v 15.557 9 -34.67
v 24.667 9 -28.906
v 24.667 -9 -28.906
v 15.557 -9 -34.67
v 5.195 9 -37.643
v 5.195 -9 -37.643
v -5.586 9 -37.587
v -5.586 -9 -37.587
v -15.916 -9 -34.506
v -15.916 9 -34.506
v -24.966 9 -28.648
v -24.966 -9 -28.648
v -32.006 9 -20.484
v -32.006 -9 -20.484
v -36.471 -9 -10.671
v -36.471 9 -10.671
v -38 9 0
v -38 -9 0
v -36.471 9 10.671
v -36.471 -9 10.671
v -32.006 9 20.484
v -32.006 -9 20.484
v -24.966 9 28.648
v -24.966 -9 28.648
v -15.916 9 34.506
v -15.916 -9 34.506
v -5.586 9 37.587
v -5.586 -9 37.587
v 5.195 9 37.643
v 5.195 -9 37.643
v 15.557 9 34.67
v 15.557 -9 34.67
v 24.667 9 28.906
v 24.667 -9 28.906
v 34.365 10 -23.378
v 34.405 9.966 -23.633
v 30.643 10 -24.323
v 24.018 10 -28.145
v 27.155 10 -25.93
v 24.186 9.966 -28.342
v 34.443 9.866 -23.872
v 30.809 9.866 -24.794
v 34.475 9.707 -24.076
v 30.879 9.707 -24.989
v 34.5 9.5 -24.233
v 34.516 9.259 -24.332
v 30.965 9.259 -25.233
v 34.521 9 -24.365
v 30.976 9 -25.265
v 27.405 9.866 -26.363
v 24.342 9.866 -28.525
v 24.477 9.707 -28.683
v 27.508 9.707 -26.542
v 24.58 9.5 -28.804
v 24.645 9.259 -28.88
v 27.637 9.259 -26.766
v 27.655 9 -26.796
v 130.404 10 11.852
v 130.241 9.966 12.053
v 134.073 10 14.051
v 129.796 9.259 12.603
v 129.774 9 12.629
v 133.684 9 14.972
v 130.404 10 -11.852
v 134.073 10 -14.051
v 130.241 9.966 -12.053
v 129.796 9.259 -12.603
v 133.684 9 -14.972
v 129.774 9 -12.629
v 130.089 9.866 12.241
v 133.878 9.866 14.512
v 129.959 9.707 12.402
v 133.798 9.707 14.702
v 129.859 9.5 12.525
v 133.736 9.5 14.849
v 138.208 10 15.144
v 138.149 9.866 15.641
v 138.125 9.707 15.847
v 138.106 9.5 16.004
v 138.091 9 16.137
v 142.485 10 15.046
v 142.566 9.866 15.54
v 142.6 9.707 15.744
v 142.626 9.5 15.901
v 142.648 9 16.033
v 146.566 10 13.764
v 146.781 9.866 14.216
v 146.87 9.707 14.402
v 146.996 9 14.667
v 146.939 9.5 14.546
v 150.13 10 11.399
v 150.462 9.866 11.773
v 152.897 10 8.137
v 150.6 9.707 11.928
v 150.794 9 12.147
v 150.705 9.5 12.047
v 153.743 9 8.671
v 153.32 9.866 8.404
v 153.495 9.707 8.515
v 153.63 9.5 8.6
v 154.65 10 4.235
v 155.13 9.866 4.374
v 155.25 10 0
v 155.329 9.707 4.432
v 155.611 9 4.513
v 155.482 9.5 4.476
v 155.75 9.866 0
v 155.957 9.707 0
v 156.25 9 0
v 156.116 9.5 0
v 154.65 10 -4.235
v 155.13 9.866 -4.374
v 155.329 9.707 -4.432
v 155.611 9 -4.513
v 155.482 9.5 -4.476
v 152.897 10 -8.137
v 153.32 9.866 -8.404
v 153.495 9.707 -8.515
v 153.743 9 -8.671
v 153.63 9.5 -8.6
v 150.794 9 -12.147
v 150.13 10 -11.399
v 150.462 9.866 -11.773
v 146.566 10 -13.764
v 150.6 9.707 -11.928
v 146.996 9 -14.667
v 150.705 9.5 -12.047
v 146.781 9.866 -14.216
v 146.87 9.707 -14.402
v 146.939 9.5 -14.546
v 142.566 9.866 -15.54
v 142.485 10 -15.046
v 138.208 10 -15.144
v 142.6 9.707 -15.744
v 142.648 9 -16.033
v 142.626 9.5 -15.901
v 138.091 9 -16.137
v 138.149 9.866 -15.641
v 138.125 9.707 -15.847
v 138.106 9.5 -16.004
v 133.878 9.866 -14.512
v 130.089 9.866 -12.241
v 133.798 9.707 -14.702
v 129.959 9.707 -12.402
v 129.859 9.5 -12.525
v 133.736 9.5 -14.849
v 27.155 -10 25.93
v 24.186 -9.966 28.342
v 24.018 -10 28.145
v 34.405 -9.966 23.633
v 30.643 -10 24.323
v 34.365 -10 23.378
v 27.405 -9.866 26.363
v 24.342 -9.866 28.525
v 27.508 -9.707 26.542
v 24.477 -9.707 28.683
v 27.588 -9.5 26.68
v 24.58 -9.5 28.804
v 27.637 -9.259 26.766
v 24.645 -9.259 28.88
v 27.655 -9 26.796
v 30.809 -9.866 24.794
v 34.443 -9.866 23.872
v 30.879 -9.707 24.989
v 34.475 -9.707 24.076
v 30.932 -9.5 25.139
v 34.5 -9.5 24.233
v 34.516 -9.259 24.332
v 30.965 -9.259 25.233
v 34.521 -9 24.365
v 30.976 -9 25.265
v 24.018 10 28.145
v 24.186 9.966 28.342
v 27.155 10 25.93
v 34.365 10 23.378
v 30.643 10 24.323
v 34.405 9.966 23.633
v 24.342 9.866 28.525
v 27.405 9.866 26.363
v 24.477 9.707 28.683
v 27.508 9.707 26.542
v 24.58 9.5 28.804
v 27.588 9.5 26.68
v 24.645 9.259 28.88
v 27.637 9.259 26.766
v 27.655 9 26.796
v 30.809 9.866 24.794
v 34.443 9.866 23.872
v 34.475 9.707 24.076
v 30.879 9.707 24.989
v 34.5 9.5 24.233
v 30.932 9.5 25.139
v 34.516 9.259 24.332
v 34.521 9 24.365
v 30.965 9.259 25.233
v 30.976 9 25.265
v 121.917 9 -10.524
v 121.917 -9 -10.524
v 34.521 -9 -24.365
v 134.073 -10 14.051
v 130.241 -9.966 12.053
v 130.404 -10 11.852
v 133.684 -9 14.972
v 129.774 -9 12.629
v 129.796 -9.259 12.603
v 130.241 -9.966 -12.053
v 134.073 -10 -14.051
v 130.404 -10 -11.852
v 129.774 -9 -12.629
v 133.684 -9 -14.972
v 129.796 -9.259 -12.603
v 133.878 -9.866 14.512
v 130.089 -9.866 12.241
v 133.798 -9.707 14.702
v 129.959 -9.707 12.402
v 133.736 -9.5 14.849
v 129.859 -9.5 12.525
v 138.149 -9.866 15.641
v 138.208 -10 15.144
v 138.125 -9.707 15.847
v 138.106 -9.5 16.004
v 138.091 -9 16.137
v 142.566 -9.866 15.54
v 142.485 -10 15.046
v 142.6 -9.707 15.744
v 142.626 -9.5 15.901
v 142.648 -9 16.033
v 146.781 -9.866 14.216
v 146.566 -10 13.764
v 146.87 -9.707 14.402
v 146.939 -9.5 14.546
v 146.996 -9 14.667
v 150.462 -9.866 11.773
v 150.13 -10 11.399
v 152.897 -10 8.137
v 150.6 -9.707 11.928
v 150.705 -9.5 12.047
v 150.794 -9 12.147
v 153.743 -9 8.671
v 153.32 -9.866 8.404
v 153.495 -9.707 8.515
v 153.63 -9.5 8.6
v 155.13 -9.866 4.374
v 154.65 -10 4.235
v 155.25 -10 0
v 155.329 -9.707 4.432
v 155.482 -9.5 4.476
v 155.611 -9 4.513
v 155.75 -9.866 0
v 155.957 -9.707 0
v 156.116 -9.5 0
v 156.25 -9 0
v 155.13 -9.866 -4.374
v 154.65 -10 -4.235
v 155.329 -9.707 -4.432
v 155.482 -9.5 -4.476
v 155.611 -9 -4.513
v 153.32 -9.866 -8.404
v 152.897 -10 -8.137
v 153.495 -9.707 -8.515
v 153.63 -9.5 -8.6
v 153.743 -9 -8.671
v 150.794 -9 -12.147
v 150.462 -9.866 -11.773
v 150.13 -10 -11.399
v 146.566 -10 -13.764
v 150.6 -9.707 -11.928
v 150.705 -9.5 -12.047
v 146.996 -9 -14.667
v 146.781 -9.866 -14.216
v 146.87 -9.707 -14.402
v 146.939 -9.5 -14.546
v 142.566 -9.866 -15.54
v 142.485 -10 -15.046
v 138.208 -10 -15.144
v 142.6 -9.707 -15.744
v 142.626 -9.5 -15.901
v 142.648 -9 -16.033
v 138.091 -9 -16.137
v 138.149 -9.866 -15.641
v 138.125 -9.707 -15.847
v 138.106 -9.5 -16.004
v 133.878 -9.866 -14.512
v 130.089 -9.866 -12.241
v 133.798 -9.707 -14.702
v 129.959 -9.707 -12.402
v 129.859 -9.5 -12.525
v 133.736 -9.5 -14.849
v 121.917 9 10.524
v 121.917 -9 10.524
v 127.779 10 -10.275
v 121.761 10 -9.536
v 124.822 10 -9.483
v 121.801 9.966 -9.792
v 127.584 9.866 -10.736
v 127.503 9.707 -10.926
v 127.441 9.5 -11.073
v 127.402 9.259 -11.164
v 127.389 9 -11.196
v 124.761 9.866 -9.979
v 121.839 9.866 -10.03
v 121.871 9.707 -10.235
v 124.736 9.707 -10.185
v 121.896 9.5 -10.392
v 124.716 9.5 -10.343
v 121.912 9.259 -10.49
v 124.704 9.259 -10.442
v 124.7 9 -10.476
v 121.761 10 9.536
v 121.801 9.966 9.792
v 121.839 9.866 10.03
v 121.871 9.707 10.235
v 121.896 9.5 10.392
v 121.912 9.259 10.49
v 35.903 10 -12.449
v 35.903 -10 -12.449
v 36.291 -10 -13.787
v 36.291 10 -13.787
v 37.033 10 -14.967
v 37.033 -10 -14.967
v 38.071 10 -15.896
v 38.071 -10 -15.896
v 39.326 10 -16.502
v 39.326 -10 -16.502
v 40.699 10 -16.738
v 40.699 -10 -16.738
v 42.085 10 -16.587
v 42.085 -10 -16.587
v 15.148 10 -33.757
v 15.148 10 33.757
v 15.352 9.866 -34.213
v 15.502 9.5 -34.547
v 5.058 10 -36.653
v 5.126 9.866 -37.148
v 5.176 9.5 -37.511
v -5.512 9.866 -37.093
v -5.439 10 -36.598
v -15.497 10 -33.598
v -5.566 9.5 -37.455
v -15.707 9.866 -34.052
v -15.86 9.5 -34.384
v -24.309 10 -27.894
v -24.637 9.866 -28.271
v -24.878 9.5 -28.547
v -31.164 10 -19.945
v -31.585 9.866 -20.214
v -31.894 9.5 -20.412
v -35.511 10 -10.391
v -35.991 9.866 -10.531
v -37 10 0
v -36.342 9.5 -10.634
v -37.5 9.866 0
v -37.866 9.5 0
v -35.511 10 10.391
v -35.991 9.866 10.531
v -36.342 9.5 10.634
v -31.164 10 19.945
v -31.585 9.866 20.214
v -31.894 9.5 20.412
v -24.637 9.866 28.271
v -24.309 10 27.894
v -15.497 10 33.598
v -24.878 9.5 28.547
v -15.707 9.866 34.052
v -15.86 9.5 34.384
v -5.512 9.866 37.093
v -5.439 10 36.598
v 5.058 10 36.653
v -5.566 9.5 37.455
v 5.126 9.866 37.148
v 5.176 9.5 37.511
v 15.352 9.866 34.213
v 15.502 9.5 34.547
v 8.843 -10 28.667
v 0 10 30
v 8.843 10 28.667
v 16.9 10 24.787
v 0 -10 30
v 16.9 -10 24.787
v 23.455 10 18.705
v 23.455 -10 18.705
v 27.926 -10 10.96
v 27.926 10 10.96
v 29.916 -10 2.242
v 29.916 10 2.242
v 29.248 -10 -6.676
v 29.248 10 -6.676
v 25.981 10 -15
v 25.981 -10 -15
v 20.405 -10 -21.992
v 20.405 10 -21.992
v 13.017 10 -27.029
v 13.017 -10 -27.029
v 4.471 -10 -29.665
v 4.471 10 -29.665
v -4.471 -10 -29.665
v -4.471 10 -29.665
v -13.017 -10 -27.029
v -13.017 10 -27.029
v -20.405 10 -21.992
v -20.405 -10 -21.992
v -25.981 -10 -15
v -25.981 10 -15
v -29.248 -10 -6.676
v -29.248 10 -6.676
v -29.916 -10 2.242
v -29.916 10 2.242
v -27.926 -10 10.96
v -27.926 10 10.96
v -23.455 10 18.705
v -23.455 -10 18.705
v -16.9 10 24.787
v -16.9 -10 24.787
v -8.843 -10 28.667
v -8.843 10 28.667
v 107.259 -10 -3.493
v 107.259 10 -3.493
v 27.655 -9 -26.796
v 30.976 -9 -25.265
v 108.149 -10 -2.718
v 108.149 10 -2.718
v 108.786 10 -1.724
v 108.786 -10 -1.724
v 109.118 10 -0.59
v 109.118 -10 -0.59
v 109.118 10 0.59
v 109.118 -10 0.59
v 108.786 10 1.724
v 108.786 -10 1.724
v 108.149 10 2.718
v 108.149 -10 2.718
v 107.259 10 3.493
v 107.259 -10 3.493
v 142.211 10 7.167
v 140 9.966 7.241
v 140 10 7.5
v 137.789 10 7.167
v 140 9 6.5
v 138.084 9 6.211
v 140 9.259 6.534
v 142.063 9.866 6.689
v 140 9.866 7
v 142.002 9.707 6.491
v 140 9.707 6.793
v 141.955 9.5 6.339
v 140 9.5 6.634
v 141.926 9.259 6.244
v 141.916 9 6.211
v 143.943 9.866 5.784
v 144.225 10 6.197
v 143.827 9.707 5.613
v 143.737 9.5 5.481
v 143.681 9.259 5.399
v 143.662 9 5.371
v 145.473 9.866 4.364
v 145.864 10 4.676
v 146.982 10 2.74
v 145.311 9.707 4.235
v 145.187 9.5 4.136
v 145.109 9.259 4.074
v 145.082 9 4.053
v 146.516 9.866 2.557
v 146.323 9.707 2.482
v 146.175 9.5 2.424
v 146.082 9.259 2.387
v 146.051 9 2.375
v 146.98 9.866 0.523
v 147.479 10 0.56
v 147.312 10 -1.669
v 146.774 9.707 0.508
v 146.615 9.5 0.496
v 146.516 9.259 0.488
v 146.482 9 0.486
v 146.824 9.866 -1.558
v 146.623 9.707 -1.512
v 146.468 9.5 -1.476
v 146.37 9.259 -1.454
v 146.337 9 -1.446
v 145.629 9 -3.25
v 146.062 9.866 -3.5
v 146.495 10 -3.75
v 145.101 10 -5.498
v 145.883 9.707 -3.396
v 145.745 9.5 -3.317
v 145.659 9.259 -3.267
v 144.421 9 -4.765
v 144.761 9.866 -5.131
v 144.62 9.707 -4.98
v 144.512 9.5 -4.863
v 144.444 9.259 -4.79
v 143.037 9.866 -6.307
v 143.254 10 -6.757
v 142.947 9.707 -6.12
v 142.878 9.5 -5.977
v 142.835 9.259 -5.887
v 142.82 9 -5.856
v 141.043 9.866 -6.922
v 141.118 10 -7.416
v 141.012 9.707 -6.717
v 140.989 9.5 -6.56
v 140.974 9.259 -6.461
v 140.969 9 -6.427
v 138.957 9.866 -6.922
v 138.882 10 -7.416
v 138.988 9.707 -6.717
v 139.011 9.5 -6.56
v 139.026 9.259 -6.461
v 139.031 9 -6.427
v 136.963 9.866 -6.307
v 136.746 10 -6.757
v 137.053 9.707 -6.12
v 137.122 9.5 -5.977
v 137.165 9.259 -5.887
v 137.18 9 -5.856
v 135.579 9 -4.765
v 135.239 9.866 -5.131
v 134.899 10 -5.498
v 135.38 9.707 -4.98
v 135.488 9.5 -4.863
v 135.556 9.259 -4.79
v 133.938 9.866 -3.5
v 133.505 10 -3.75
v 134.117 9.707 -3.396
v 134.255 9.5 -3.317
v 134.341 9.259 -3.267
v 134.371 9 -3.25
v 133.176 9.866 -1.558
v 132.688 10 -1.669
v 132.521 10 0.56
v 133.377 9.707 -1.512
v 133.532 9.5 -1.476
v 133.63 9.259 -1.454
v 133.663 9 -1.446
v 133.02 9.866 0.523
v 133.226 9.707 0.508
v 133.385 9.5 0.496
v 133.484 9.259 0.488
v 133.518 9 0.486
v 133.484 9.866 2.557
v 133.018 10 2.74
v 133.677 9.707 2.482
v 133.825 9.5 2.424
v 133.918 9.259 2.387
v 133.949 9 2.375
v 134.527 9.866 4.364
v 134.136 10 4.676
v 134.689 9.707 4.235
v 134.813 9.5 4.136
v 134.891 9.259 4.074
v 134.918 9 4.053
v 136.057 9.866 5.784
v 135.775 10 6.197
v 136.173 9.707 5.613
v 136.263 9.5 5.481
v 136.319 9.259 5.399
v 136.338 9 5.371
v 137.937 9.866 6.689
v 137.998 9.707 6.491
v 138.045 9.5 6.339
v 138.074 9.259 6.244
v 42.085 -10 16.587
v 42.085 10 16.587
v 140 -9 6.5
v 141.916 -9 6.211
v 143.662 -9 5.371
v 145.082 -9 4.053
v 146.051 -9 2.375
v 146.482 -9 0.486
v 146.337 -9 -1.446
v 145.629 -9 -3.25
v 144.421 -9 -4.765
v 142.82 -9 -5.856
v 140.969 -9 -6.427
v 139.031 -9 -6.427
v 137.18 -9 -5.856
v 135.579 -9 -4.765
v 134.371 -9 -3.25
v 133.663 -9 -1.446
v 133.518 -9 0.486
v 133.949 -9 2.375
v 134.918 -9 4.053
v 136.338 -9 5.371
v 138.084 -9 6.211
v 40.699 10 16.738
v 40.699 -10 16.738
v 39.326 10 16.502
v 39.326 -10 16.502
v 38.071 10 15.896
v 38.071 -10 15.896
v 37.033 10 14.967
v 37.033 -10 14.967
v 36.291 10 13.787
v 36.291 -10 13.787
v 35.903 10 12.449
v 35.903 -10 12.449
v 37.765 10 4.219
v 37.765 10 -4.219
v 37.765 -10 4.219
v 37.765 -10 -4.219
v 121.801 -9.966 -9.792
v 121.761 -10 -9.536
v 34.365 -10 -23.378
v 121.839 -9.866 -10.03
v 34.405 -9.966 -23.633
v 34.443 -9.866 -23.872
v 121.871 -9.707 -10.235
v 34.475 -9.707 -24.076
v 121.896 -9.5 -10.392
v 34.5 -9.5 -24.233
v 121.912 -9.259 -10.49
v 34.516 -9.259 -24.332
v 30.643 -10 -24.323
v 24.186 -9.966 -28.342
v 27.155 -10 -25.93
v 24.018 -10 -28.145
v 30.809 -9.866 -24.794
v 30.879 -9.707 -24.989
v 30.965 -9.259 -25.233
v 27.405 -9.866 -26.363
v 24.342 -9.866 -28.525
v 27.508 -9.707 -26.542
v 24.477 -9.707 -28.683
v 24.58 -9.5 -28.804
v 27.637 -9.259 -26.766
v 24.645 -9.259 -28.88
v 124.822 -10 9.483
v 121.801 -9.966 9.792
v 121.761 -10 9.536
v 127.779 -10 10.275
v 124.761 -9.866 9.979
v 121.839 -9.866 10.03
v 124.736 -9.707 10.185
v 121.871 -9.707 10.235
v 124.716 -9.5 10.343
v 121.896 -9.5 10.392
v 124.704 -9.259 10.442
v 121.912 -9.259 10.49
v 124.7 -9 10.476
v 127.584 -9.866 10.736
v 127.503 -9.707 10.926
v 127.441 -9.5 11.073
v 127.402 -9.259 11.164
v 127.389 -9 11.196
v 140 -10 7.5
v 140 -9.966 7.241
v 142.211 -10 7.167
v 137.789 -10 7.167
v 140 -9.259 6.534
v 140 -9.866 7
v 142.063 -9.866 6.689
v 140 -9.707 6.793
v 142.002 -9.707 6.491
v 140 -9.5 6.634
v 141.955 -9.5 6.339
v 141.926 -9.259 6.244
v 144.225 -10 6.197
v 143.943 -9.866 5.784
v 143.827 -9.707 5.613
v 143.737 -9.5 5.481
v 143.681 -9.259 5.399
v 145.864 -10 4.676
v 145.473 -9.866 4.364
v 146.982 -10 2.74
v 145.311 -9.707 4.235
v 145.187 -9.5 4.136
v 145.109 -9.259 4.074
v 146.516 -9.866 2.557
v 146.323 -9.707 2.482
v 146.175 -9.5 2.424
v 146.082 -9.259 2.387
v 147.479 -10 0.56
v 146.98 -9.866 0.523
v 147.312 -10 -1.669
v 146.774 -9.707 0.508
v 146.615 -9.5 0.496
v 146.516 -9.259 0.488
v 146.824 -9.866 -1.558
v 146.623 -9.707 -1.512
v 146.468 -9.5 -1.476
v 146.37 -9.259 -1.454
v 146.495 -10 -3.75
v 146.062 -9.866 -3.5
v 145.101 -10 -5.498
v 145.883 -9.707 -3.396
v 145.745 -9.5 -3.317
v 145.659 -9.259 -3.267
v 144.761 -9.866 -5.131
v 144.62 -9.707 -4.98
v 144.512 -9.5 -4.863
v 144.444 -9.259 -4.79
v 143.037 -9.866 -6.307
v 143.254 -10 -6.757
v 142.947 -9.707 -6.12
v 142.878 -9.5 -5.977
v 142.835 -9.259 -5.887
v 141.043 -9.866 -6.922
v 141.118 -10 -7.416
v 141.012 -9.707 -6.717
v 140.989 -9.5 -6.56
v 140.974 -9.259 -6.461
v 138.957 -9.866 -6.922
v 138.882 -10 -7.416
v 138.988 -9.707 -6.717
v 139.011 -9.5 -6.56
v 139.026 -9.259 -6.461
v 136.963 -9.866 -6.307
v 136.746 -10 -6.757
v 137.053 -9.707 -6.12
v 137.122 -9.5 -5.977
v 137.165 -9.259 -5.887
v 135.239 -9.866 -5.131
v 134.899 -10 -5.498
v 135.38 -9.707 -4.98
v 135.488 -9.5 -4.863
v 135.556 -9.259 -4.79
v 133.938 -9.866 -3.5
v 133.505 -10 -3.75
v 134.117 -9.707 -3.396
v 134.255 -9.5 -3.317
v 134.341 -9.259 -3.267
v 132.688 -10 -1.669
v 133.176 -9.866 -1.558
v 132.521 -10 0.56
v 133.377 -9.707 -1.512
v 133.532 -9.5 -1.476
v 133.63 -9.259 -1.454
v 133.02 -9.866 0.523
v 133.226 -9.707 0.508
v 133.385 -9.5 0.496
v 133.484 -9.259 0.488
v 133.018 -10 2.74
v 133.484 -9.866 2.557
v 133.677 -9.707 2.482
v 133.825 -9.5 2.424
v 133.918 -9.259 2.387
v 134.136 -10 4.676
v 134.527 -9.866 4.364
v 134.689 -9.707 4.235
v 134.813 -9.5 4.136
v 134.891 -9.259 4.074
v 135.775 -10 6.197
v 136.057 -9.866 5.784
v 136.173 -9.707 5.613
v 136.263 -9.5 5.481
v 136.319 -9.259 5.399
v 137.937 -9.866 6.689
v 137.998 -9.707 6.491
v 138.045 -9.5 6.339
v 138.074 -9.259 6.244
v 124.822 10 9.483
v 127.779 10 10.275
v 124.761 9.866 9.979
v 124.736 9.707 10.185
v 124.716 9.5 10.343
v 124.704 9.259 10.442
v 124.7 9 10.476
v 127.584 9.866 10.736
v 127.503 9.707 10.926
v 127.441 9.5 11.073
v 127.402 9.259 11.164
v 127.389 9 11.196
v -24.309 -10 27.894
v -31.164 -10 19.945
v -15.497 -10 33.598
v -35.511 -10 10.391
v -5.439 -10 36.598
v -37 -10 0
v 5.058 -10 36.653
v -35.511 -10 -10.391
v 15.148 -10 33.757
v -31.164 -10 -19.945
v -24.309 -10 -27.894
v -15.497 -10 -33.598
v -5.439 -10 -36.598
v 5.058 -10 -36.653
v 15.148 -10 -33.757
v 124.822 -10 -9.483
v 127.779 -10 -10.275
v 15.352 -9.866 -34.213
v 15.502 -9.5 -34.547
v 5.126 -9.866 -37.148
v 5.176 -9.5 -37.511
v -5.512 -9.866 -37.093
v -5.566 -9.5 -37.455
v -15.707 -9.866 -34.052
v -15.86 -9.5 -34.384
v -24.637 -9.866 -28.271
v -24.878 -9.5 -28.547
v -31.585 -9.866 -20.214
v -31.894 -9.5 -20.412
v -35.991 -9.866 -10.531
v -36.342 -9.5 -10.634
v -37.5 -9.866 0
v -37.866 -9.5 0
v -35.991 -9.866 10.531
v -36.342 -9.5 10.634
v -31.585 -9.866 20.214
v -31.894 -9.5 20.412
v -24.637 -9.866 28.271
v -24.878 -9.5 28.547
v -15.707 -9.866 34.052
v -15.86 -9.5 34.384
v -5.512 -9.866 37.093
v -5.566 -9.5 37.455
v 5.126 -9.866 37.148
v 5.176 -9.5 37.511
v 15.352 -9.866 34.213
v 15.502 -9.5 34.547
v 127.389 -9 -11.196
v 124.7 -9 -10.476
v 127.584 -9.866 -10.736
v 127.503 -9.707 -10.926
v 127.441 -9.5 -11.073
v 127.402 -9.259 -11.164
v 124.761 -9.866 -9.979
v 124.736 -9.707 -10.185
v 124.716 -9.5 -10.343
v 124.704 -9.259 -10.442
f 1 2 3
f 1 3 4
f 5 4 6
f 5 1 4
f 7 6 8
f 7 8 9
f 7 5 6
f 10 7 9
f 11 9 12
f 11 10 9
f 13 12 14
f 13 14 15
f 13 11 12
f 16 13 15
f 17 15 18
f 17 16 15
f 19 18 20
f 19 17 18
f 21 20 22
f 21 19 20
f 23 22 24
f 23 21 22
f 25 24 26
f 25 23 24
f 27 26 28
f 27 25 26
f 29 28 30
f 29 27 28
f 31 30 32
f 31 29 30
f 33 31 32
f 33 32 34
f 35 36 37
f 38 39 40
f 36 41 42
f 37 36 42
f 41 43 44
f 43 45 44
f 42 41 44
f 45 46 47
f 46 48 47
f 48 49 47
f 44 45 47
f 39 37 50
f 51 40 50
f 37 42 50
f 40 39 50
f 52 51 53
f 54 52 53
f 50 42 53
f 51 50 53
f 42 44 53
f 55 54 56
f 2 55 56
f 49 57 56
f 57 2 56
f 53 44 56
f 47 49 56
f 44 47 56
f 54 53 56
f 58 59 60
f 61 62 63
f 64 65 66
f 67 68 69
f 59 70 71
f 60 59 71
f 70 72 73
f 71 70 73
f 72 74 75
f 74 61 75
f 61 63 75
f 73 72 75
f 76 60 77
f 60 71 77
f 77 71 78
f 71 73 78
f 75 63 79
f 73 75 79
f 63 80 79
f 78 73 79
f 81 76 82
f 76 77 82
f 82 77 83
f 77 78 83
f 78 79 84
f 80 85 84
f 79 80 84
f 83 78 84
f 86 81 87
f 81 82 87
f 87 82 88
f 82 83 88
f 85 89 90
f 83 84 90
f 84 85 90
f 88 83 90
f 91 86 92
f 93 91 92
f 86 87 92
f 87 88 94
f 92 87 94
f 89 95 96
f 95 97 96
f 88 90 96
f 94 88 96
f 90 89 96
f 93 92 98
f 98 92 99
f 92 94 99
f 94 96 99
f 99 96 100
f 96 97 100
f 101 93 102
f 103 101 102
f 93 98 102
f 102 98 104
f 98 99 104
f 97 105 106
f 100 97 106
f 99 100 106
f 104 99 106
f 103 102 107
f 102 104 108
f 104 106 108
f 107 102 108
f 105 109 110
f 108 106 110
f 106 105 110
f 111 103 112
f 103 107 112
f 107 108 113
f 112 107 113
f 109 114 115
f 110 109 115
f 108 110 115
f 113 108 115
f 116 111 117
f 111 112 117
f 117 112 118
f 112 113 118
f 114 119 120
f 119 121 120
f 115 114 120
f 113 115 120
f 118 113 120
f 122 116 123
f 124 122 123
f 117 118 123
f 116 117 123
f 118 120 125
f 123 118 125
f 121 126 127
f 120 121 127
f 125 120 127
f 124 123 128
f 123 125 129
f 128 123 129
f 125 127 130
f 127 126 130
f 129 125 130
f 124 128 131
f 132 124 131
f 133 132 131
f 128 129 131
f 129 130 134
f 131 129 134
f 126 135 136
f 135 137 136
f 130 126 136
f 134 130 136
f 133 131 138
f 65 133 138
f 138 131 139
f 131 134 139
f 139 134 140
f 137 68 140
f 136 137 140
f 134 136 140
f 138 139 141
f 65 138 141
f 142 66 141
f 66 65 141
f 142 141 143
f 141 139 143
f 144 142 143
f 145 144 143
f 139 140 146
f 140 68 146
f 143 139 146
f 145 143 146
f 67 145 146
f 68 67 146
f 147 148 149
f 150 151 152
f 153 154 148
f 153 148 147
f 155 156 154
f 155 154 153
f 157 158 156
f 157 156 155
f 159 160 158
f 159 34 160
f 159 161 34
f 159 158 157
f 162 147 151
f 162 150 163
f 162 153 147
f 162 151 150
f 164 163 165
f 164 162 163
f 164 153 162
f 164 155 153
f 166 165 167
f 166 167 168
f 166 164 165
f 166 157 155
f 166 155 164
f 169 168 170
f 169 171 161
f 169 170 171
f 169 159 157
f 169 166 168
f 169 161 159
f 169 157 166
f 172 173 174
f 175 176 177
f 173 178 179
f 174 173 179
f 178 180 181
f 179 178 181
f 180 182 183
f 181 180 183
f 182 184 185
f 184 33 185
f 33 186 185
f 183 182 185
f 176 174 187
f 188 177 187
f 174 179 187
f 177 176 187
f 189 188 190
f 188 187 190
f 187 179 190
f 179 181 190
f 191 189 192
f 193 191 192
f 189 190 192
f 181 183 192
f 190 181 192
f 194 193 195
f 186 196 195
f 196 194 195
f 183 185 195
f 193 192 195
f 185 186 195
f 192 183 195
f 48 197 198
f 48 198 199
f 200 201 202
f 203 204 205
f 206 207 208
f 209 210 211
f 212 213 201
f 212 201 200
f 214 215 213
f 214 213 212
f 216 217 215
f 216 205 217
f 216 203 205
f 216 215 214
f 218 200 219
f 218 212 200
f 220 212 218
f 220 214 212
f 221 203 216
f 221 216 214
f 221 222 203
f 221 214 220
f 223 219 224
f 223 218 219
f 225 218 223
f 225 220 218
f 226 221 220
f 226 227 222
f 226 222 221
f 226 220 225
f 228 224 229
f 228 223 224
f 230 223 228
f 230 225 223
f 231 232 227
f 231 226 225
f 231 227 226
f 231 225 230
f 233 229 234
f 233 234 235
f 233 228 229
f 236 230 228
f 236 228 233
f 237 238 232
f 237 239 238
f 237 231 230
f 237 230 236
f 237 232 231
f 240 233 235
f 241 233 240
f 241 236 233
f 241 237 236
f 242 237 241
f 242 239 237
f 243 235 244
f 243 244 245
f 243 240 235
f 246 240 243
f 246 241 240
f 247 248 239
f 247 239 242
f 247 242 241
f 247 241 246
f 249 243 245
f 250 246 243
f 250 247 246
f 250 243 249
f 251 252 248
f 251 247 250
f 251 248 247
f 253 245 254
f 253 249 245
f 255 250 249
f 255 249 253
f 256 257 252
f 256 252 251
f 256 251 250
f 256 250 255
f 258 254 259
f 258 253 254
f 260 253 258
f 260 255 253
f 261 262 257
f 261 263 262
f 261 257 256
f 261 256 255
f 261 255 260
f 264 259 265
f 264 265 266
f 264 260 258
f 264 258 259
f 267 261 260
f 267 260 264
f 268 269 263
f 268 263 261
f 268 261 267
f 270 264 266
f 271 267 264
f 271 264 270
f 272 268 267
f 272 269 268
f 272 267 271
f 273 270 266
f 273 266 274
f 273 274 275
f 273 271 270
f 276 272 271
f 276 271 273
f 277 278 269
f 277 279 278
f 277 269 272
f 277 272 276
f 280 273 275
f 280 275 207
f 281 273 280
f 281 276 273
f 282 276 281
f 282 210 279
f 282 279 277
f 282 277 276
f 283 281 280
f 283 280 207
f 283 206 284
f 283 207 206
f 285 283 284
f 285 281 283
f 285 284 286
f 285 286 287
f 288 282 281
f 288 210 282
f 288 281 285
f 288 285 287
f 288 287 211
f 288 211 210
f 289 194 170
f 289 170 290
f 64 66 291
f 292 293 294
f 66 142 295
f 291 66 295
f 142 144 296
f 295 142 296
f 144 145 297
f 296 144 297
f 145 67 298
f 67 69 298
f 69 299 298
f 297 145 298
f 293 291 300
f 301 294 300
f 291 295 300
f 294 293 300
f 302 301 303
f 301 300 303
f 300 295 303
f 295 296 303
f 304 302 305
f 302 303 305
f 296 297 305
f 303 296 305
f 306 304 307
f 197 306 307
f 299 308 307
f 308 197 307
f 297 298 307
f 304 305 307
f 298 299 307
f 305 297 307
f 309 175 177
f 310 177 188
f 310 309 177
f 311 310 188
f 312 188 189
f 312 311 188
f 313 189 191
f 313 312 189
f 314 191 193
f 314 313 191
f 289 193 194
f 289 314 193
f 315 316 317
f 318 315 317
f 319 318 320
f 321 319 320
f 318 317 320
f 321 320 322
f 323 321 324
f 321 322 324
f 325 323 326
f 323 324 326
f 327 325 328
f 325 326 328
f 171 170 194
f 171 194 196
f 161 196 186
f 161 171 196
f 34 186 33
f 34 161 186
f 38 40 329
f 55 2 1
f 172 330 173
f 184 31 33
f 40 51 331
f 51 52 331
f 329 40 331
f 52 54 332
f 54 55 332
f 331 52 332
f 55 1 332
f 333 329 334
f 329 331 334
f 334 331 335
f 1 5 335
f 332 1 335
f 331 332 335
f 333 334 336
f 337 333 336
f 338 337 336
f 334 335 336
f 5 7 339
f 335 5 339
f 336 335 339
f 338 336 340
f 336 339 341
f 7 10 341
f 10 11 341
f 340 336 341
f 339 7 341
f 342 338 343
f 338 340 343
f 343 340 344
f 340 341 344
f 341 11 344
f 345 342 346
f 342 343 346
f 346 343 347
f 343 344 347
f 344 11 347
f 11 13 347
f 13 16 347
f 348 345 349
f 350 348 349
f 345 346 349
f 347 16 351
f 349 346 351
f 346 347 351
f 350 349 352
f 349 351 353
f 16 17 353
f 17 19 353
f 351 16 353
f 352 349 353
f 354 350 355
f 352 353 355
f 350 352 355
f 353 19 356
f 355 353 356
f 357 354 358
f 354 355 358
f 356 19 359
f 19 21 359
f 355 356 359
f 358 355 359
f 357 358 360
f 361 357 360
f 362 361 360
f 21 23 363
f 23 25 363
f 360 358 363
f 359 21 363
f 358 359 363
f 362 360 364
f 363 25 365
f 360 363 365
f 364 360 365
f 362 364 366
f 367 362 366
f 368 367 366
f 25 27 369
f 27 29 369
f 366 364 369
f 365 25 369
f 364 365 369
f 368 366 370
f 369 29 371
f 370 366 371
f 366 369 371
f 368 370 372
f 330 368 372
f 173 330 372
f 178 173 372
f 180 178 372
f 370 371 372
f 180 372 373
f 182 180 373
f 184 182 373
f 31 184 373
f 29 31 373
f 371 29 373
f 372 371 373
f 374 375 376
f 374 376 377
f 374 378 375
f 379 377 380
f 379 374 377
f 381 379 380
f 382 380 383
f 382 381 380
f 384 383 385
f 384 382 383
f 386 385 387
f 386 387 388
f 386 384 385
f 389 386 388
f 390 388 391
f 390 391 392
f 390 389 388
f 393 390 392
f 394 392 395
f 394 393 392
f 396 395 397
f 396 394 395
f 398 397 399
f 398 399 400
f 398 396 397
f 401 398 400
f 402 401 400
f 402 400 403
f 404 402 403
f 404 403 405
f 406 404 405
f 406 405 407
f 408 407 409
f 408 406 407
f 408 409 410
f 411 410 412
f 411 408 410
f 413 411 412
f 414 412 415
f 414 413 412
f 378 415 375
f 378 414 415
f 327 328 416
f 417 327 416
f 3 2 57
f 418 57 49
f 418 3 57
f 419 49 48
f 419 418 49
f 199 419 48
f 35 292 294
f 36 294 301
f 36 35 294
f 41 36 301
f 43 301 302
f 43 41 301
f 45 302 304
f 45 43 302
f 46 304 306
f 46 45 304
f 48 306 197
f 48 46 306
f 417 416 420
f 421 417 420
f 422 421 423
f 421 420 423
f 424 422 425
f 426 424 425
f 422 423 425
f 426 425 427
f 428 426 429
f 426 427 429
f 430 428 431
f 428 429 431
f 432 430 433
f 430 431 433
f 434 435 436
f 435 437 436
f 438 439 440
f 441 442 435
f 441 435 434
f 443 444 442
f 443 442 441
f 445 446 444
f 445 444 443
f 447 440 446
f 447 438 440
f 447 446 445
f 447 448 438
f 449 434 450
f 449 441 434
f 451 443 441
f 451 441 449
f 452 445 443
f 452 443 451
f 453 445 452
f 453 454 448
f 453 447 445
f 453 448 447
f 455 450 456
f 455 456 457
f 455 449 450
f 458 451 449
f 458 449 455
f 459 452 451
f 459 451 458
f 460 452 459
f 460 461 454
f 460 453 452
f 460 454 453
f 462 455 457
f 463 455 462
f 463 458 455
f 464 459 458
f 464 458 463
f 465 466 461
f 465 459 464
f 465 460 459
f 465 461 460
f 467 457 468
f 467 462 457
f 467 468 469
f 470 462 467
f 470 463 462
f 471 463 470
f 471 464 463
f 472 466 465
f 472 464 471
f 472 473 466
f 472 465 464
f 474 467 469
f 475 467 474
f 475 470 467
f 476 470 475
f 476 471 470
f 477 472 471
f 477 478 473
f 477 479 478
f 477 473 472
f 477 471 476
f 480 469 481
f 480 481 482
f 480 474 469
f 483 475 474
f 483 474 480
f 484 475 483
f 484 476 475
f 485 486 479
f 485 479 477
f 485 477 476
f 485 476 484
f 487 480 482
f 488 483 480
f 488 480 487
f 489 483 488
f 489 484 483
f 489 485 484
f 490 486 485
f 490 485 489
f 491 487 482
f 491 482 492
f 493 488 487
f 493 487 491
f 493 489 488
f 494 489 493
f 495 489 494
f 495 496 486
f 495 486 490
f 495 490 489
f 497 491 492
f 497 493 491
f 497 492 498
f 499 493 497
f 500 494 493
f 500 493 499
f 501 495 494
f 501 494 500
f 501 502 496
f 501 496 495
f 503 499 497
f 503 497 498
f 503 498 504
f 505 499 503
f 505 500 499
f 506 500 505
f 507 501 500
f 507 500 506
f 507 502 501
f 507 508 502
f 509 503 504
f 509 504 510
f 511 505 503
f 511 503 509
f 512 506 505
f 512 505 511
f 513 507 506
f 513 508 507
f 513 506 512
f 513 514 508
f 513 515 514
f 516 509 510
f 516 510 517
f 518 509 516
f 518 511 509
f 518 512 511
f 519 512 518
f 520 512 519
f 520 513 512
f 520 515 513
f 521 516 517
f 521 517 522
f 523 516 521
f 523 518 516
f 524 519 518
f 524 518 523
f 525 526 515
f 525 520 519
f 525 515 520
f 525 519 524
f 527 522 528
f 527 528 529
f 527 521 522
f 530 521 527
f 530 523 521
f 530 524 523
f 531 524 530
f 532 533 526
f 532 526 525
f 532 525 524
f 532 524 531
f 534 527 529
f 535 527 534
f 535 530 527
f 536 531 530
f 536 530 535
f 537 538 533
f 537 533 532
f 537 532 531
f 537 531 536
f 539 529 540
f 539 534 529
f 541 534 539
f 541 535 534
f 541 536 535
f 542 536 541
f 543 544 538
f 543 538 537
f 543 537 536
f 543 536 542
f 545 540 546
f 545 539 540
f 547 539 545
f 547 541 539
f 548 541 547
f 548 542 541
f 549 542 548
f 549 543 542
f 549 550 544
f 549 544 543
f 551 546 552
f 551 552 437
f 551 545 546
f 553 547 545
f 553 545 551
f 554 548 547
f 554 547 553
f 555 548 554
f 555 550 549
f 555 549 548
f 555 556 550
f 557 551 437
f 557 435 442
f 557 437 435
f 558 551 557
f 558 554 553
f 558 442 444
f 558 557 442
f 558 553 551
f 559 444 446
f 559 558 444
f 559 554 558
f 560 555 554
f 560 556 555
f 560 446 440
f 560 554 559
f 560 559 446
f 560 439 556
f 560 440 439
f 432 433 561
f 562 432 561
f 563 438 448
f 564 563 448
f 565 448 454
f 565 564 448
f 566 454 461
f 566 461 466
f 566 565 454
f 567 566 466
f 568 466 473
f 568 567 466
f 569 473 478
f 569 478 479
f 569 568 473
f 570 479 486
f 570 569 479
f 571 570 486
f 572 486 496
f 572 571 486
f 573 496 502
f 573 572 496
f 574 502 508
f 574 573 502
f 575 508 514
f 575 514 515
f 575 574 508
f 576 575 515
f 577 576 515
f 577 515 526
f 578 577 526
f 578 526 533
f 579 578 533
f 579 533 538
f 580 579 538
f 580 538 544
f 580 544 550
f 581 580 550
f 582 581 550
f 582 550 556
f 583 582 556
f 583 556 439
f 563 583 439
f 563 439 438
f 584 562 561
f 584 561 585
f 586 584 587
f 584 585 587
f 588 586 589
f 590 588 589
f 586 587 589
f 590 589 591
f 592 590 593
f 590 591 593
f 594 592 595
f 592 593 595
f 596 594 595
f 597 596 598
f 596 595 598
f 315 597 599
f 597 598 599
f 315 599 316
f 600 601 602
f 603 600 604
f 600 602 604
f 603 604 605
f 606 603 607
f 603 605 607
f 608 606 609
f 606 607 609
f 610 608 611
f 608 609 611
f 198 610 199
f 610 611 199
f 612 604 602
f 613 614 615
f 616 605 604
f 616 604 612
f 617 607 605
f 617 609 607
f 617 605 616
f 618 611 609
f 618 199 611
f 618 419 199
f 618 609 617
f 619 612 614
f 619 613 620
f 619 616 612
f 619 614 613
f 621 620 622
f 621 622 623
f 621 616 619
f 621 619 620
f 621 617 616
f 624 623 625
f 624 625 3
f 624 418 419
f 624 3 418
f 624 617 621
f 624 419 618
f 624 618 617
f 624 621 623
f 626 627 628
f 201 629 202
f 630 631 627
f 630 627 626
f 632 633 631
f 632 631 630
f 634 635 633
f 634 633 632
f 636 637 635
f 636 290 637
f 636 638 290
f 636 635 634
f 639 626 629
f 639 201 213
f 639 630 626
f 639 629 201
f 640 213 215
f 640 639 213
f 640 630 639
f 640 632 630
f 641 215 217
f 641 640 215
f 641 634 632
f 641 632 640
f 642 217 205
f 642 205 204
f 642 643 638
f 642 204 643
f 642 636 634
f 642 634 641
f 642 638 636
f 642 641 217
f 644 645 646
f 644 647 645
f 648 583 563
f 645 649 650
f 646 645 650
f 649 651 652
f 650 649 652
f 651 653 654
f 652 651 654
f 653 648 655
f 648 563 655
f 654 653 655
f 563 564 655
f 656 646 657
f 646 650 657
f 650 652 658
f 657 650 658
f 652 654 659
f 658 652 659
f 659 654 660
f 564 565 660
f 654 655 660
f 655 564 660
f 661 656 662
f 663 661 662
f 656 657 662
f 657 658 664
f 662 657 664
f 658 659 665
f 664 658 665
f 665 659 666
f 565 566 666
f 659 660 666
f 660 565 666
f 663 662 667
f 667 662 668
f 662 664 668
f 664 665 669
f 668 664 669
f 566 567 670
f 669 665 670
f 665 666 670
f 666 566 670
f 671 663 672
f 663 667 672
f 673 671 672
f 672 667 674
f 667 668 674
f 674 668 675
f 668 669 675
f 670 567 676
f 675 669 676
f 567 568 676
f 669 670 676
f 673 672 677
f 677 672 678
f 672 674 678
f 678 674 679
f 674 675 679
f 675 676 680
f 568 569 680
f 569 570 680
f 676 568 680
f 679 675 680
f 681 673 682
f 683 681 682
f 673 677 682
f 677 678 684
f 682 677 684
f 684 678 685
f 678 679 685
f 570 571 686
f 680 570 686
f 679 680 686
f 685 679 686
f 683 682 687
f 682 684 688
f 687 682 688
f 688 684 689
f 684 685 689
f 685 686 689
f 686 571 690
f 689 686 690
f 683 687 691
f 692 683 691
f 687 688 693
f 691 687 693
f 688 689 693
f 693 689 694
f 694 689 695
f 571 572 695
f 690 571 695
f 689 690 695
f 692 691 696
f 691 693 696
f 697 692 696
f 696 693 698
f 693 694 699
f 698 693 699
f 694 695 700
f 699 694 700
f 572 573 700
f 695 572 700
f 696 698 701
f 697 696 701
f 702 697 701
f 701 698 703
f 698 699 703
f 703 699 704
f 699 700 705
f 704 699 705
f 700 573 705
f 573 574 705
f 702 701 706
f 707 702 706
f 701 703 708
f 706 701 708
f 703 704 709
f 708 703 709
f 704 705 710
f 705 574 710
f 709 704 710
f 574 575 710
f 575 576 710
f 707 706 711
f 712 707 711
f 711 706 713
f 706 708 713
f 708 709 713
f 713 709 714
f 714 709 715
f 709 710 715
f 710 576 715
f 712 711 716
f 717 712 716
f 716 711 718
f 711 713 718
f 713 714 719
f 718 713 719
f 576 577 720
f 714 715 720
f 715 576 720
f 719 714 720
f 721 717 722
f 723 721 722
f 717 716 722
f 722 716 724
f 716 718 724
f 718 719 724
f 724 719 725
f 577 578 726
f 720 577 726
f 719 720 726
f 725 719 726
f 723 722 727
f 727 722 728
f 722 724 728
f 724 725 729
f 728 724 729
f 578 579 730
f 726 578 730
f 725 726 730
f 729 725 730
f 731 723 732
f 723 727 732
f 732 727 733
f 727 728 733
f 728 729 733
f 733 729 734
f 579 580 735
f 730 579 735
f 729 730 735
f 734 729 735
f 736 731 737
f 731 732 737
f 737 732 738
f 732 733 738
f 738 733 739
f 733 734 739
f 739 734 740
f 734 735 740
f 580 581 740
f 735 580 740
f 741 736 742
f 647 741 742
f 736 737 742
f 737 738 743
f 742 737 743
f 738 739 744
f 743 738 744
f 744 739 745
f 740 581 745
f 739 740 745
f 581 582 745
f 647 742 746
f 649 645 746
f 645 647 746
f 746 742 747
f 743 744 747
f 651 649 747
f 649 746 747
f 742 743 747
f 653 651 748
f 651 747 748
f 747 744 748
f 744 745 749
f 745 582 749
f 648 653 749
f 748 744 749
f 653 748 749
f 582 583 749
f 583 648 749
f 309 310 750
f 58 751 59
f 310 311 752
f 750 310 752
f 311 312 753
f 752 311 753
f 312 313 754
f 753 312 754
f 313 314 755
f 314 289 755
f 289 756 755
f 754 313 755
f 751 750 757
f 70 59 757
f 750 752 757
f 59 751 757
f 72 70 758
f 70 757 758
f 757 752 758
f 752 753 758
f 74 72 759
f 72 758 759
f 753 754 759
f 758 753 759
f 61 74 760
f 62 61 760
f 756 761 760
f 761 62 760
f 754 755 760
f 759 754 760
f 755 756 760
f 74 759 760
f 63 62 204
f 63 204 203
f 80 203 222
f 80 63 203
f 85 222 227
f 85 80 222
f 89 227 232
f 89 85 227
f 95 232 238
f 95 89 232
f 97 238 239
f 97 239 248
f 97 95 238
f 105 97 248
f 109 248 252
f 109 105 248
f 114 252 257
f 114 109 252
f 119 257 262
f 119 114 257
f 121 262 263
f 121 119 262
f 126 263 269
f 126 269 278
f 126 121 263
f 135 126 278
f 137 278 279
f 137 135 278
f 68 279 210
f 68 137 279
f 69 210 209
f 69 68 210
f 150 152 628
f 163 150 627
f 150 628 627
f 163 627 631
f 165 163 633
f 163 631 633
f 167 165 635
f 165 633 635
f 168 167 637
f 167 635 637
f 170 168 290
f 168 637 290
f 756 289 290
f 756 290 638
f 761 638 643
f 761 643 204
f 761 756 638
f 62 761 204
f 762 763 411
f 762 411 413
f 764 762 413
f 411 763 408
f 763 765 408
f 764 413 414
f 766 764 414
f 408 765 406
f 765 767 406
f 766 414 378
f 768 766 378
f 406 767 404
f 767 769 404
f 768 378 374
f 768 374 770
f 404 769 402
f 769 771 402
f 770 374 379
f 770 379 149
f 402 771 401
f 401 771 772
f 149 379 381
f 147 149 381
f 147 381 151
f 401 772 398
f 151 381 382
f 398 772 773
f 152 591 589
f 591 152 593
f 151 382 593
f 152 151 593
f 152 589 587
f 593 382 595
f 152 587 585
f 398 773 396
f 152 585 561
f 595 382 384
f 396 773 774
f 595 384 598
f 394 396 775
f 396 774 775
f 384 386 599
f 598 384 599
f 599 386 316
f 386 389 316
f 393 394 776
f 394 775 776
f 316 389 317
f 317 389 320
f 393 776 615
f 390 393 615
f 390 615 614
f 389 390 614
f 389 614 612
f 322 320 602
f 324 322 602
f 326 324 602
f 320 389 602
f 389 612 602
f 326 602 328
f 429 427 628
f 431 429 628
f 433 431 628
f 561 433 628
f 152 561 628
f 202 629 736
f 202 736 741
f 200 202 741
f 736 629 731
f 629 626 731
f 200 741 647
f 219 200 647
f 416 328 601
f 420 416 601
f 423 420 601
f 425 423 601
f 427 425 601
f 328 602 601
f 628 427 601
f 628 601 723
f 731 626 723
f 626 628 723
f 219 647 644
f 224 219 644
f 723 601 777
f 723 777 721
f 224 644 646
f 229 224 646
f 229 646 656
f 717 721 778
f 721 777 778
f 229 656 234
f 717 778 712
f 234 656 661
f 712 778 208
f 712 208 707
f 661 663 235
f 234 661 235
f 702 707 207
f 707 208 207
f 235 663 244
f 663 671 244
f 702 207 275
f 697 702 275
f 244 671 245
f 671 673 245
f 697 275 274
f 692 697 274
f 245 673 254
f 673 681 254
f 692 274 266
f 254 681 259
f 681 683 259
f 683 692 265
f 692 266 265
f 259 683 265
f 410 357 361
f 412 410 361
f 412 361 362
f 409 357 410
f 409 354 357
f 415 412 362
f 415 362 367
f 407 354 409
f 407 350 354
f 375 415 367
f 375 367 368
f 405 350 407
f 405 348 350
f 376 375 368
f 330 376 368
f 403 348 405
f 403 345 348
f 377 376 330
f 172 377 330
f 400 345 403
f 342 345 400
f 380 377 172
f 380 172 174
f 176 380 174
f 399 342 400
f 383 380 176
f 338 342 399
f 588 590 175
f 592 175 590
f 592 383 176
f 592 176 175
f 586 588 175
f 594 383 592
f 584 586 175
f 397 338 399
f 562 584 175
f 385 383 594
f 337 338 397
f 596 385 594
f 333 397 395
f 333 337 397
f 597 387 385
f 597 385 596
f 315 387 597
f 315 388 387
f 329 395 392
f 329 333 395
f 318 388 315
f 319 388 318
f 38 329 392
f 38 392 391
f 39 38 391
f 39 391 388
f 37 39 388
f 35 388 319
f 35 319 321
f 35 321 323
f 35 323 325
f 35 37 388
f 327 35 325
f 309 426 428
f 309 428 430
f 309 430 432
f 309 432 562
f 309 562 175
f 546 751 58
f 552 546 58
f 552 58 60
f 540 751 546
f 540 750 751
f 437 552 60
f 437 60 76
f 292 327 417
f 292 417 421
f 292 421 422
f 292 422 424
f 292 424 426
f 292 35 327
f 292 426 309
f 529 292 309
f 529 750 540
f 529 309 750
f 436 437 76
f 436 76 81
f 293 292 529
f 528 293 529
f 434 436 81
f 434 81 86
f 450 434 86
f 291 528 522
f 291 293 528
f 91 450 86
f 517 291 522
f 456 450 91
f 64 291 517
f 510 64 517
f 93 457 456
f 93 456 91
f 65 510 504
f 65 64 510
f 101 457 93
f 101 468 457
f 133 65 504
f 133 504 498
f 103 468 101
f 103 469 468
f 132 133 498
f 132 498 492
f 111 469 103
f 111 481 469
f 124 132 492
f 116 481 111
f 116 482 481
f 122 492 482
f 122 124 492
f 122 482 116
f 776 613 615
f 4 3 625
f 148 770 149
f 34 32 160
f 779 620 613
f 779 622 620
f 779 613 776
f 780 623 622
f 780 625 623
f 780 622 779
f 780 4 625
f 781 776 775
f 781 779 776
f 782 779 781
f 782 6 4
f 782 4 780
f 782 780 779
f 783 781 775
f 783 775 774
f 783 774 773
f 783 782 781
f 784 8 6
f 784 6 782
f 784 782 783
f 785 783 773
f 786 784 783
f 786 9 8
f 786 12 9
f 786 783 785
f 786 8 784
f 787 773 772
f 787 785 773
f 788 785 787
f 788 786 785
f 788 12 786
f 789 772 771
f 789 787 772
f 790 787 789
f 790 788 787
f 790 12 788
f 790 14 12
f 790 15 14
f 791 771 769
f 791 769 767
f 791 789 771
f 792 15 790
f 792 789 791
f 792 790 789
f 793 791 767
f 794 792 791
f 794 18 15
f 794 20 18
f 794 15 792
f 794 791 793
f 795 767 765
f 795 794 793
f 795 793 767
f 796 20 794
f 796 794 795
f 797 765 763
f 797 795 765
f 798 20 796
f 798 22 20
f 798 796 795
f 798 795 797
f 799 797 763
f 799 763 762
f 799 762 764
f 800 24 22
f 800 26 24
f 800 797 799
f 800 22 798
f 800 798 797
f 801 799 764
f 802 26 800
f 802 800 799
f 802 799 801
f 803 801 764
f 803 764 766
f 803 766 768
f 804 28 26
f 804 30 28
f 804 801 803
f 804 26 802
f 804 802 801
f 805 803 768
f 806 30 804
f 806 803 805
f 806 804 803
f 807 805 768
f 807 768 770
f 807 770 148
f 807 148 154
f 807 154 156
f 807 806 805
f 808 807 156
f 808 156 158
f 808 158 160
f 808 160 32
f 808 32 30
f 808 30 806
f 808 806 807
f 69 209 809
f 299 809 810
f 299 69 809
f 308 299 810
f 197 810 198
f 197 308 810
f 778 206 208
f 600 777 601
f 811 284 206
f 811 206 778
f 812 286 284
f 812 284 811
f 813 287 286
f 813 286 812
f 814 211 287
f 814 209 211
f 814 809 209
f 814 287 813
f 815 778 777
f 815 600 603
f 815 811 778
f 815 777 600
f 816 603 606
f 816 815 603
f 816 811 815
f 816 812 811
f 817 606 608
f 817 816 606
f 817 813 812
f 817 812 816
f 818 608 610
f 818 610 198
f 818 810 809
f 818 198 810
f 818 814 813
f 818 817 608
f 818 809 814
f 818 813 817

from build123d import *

# Parameters (mm, degrees)
SKETCH1_R           = 30
SKETCH1_R_2         = 6.5
BOSS_EXTRUDE1_DEPTH = 10
FILLET1_R           = 20
FILLET2_R           = 10
CUT_EXTRUDE1_DEPTH  = 163.043396965
FILLET3_R           = 1


with BuildPart() as part:
    # Sketch1 → Boss-Extrude1 (new, symmetric)
    with BuildSketch(Plane(origin=(0, 0, 0), x_dir=(1, 0, 0), z_dir=(0, 1, 0))):
        with BuildLine():
            Line((28.309347234, -25.349178669), (126.979372859, -9.722436364))
            ThreePointArc((126.979372859, -9.722436364), (156.25, 0), (126.979372859, 9.722436364))
            Line((126.979372859, 9.722436364), (28.309347234, 25.349178669))
            ThreePointArc((28.309347234, 25.349178669), (-38, 0), (28.309347234, -25.349178669))
        make_face()
        with Locations(Location((0, 0, 0), (0, 0, 270))):
            Circle(SKETCH1_R, mode=Mode.SUBTRACT)
        with Locations(Location((140, 0, 0), (0, 0, 270))):
            Circle(SKETCH1_R_2, mode=Mode.SUBTRACT)
    extrude(amount=BOSS_EXTRUDE1_DEPTH, both=True)

    # Fillet1
    fillet1_edges = [part.edges().sort_by_distance(p)[0] for p in [
        (28.309347234, 0, -25.349178669),
        (28.309347234, 0, 25.349178669),
    ]]
    fillet(fillet1_edges, radius=FILLET1_R)

    # Fillet2
    fillet2_edges = [part.edges().sort_by_distance(p)[0] for p in [
        (126.979372859, 0, -9.722436364),
        (126.979372859, 0, 9.722436364),
    ]]
    fillet(fillet2_edges, radius=FILLET2_R)

    # Sketch2 → Cut-Extrude1 (cut, through all)
    with BuildSketch(Plane.XZ.offset(10)):
        with BuildLine():
            Line((42.084593021, -16.586528838), (107.258618966, -3.493133042))
            ThreePointArc((107.258618966, -3.493133042), (109.159728126, 0), (107.258618966, 3.493133042))
            Line((107.258618966, 3.493133042), (42.084593021, 16.586528838))
            ThreePointArc((42.084593021, 16.586528838), (38.071391156, 15.895857226), (35.902950989, 12.449020454))
            ThreePointArc((35.902950989, 12.449020454), (38, 0), (35.902950989, -12.449020454))
            ThreePointArc((35.902950989, -12.449020454), (38.071391156, -15.895857226), (42.084593021, -16.586528838))
        make_face()
    extrude(amount=-CUT_EXTRUDE1_DEPTH, mode=Mode.SUBTRACT)

    # Fillet3
    fillet3_edges = [part.edges().sort_by_distance(p)[0] for p in [
        (140, -10, -6.5),
        (140, 10, -6.5),
        (-38, -10, 0),
        (-38, 10, 0),
        (78.219231742, -10, 17.444762928),
        (78.219231742, 10, 17.444762928),
        (29.280338441, -10, -25.954540832),
        (29.280338441, 10, -25.954540832),
        (29.280338441, -10, 25.954540832),
        (29.280338441, 10, 25.954540832),
        (78.219231742, -10, -17.444762928),
        (78.219231742, 10, -17.444762928),
        (156.25, -10, 0),
        (156.25, 10, 0),
        (126.069482803, -10, -10.74171894),
        (126.069482803, 10, -10.74171894),
        (126.069482803, -10, 10.74171894),
        (126.069482803, 10, 10.74171894),
        (140, -10, -6.5),
        (140, 10, -6.5),
    ]]
    fillet(fillet3_edges, radius=FILLET3_R)


solid = part.part
